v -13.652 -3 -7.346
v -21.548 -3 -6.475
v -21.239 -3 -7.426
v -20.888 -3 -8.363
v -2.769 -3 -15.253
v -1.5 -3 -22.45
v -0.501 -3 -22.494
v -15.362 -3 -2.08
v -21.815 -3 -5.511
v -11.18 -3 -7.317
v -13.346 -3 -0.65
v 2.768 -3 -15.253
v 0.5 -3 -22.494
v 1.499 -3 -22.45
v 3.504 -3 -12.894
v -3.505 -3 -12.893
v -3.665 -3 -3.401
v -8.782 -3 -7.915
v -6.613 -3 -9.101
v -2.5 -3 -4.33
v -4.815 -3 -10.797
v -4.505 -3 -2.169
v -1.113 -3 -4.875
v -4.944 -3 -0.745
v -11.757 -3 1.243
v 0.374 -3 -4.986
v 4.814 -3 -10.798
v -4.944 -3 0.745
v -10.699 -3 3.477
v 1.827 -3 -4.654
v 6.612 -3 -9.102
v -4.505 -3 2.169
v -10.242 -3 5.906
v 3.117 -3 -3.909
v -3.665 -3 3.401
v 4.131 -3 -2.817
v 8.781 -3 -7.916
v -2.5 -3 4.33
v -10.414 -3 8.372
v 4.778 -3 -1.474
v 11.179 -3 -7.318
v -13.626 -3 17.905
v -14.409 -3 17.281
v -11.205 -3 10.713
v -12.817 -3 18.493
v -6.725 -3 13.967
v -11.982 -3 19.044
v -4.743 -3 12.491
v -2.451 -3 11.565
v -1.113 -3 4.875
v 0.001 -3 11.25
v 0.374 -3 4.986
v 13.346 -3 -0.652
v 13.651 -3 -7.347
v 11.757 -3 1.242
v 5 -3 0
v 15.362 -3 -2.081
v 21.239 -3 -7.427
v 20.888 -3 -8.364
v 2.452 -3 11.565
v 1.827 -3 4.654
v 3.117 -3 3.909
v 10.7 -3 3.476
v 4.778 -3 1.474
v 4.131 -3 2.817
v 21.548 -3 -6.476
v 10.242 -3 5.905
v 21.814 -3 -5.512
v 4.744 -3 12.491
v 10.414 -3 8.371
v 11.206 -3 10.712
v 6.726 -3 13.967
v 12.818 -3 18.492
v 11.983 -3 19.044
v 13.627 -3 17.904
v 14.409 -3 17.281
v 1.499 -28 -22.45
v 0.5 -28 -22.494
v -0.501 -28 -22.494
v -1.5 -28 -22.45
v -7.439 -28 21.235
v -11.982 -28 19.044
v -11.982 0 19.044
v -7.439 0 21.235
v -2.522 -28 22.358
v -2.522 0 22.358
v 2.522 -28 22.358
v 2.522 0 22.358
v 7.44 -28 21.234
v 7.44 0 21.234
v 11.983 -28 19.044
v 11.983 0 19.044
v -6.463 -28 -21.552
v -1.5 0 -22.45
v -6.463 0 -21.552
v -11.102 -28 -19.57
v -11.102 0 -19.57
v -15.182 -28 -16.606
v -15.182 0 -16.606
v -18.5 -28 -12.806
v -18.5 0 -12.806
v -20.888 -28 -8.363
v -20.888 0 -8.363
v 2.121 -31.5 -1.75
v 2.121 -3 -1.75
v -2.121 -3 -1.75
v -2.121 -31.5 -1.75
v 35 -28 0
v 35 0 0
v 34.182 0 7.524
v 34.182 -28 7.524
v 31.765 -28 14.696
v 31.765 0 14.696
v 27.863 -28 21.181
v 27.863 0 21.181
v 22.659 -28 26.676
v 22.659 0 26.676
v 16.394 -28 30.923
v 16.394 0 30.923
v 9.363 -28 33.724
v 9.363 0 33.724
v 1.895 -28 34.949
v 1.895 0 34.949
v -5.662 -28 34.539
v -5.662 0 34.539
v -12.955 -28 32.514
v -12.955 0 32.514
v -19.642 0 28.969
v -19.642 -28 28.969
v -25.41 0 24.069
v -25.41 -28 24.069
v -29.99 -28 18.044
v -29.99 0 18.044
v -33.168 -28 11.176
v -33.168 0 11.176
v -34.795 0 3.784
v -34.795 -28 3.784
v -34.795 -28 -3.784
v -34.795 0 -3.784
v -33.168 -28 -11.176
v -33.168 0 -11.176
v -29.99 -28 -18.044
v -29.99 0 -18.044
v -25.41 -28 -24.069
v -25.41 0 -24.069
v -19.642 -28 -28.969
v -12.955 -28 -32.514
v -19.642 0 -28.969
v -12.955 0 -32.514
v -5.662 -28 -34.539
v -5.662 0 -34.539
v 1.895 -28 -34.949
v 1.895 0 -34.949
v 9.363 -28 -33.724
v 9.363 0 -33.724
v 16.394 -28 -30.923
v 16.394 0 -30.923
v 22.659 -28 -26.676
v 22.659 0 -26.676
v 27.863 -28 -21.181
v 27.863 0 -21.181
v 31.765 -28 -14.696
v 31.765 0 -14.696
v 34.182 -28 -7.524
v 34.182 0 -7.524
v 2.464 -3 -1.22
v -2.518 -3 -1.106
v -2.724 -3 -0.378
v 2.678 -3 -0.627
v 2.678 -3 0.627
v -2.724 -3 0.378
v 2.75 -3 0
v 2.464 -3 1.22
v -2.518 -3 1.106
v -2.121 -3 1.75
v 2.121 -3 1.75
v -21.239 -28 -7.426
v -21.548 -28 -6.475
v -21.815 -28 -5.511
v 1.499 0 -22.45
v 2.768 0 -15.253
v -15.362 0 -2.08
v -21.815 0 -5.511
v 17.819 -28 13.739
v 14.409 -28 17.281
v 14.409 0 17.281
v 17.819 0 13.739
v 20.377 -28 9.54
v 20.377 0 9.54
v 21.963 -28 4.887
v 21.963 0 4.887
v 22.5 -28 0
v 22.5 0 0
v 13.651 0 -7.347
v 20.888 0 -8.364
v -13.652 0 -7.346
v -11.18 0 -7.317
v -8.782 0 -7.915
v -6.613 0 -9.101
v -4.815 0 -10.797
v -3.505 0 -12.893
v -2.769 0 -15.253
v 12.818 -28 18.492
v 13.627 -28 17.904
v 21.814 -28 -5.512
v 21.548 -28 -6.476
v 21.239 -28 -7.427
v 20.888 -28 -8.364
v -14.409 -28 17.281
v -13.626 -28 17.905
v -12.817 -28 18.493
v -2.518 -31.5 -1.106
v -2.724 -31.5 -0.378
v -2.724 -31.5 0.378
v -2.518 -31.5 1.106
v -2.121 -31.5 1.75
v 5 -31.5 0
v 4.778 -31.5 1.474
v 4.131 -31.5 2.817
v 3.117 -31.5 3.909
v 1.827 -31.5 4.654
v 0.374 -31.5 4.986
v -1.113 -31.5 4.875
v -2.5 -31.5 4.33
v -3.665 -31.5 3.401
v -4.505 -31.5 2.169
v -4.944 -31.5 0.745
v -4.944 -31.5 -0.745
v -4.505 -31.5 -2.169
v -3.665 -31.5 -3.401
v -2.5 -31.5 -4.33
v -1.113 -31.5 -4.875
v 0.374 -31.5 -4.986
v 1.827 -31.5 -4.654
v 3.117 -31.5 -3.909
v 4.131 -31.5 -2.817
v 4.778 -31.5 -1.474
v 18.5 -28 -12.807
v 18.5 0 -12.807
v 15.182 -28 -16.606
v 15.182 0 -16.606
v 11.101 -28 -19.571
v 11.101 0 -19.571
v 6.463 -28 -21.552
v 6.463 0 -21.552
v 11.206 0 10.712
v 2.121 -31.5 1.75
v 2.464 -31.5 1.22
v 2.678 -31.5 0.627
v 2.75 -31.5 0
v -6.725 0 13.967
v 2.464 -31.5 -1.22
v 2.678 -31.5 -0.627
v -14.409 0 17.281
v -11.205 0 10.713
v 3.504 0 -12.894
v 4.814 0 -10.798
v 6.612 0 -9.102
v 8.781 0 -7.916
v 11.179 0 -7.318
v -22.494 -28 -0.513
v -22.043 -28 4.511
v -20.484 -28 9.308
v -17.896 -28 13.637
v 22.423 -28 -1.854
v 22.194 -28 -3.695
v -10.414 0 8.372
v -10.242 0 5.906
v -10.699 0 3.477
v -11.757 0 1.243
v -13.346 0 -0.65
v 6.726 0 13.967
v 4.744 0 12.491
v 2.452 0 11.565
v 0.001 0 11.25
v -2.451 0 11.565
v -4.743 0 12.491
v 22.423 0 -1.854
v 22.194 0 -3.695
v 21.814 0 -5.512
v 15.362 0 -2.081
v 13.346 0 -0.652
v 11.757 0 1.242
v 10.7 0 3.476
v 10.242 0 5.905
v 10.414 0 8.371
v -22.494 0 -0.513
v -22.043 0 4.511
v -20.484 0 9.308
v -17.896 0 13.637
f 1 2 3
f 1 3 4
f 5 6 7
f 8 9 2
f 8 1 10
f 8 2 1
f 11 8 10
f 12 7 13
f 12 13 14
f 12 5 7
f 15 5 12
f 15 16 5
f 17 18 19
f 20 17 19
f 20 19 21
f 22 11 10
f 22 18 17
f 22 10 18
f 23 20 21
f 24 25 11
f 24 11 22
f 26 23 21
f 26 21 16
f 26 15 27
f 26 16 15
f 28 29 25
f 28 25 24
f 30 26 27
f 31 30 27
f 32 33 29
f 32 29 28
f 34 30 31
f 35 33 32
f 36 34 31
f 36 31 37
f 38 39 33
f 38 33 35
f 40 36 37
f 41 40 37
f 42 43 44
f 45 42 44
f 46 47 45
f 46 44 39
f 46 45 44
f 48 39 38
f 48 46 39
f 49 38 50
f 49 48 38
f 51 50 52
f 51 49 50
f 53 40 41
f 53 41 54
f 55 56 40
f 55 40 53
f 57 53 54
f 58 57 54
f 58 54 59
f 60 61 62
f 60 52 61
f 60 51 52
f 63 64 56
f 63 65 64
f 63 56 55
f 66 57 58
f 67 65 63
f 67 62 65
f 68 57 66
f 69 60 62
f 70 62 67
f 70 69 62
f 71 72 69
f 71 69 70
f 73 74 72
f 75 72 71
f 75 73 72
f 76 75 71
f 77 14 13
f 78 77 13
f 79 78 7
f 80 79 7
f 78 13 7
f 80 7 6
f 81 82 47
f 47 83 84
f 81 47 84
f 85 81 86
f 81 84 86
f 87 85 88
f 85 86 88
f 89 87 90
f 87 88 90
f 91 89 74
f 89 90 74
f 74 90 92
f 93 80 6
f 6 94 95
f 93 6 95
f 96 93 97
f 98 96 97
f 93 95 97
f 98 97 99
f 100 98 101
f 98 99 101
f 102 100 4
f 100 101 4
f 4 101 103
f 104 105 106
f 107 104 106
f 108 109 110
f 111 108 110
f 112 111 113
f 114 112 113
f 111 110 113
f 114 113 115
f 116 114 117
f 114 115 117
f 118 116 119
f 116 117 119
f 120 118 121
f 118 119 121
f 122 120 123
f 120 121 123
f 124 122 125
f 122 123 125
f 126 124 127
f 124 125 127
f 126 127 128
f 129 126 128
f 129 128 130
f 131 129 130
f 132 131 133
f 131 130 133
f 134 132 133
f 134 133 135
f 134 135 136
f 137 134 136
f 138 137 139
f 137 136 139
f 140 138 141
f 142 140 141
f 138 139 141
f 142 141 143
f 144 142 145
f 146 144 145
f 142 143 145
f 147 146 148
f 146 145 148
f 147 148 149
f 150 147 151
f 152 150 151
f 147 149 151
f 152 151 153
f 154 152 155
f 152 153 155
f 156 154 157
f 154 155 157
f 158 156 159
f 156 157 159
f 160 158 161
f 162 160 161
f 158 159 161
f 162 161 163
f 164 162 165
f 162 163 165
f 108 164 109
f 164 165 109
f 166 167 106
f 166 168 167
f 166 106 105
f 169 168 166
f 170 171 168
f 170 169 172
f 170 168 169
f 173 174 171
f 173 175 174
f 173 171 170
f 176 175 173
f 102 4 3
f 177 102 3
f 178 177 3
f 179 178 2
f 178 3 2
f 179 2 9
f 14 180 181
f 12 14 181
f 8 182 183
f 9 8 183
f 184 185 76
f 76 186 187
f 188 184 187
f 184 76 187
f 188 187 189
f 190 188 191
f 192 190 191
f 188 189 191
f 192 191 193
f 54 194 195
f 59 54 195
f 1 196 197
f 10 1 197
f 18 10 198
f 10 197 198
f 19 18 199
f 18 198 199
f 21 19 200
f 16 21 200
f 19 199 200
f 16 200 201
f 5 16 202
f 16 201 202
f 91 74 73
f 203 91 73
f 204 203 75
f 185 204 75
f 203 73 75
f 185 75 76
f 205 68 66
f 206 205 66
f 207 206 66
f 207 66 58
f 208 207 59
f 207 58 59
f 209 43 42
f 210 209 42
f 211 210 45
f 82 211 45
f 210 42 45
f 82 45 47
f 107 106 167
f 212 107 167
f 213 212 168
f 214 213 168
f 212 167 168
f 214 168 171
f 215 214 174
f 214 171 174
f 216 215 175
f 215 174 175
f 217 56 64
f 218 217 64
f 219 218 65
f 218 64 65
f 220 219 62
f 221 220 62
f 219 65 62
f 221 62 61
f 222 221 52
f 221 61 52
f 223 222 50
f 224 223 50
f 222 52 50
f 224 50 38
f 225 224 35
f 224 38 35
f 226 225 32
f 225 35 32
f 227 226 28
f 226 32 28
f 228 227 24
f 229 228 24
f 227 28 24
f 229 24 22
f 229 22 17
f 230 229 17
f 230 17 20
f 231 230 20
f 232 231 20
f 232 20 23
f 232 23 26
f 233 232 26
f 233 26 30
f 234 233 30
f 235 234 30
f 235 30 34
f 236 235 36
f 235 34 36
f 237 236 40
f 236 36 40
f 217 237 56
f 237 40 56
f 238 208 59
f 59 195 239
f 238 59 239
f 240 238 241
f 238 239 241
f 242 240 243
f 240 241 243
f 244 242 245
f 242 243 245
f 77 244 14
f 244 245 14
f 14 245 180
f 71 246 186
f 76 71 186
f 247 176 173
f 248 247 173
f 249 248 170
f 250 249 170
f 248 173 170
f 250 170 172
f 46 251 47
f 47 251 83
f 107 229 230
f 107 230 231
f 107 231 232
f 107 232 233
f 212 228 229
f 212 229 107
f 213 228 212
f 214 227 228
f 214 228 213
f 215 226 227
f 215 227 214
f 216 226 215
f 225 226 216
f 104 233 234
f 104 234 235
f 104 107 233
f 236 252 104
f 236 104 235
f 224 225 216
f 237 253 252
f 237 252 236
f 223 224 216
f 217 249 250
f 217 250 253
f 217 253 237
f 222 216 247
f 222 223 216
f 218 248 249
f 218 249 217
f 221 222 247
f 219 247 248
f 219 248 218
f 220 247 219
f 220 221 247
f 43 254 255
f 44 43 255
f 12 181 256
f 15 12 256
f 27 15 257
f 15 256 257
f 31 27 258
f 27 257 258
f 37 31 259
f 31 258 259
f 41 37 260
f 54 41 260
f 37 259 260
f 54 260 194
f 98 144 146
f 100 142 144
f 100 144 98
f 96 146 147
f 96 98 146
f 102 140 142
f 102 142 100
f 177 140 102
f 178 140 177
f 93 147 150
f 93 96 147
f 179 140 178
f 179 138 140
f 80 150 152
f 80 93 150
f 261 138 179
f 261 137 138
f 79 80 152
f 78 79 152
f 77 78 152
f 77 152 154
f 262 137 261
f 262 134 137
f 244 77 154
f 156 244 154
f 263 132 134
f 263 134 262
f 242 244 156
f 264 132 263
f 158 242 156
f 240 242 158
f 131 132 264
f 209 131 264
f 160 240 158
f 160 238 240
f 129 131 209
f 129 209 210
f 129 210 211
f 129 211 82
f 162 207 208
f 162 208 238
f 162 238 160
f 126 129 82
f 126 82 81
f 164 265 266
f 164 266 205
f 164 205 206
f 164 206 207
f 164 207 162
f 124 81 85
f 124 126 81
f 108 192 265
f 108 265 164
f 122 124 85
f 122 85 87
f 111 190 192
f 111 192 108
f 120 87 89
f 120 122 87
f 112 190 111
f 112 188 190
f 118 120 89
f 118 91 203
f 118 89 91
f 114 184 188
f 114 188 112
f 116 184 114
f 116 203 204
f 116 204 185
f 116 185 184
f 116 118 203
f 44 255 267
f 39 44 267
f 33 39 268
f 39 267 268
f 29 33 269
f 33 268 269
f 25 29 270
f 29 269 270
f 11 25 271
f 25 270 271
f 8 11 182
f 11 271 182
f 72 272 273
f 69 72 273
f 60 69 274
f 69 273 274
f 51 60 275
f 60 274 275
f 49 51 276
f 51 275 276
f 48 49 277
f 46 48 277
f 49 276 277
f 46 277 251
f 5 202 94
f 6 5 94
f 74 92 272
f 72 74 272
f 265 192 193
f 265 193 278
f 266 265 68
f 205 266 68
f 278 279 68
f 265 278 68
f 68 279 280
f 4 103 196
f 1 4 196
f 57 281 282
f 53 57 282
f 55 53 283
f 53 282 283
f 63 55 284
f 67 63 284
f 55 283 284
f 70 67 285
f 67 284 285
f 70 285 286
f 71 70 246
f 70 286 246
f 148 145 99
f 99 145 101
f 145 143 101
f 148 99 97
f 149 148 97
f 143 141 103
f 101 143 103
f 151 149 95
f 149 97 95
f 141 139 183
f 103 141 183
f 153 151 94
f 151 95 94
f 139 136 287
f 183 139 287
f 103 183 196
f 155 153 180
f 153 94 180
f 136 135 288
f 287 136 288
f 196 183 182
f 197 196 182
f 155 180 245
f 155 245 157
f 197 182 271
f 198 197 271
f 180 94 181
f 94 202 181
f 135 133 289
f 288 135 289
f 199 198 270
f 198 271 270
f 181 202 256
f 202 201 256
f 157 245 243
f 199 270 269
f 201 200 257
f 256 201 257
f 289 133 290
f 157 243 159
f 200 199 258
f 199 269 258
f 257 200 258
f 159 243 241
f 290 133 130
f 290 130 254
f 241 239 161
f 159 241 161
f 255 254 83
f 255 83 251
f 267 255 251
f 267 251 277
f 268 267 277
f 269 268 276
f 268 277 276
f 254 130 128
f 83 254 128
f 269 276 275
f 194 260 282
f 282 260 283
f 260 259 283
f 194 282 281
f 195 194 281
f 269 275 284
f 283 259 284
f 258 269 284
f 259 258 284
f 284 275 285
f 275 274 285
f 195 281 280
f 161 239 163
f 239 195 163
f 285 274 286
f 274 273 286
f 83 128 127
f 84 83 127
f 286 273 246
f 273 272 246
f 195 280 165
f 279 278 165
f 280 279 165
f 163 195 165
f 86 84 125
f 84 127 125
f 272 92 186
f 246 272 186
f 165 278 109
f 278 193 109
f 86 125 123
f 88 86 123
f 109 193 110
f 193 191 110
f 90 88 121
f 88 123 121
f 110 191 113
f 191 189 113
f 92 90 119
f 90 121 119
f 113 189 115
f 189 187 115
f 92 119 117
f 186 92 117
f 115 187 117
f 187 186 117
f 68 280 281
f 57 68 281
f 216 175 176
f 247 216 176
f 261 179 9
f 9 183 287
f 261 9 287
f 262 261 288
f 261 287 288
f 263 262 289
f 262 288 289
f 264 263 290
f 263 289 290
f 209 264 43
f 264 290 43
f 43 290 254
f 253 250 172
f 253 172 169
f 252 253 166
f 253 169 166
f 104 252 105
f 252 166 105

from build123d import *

# Parameters (mm, degrees)
F0_R     = 8.75
F1_DEPTH = 3
F0_R_2   = 35
F2_DEPTH = 28
F3_R     = 5
F4_DEPTH = 28.5


with BuildPart() as f1:
    # F0 (on Front) → F1 (new body)
    with BuildSketch(Plane.XZ):
        with BuildLine():
            Line((11.2055757109, 10.7121584512), (14.409271678, 17.2807085997))
            ThreePointArc((14.409271678, 17.2807085997), (13.2255061098, 18.2026368458), (11.9829277906, 19.043619445))
            Line((11.9829277906, 19.043619445), (6.7263225873, 13.9673748066))
            ThreePointArc((6.7263225873, 13.9673748066), (0.0005839076, 11.2499999919), (-6.7251547721, 13.9673748066))
            Line((-6.7251547721, 13.9673748066), (-11.9822206949, 19.0440643566))
            ThreePointArc((-11.9822206949, 19.0440643566), (-13.2248302388, 18.2031278948), (-14.4086300373, 17.2812436025))
            Line((-14.4086300373, 17.2812436025), (-11.2052148362, 10.7132691094))
            ThreePointArc((-11.2052148362, 10.7132691094), (-10.6992053632, 3.4769965133), (-15.3619499397, -2.0798460871))
            Line((-15.3619499397, -2.0798460871), (-21.8146913282, -5.5108295434))
            ThreePointArc((-21.8146913282, -5.5108295434), (-21.3989006928, -6.9524851052), (-20.887950885, -8.3632235308))
            Line((-20.887950885, -8.3632235308), (-13.6515262074, -7.3462103663))
            ThreePointArc((-13.6515262074, -7.3462103663), (-6.6130564747, -9.1010979679), (-2.7690524241, -15.2527903798))
            Line((-2.7690524241, -15.2527903798), (-1.5, -22.4499443206))
            ThreePointArc((-1.5, -22.4499443206), (-0.0004177112, -22.4999999961), (1.4991664351, -22.45))
            Line((1.4991664351, -22.45), (2.7681076417, -15.2534768043))
            ThreePointArc((2.7681076417, -15.2534768043), (6.6121116923, -9.1017843924), (13.650581425, -7.3468967909))
            Line((13.650581425, -7.3468967909), (20.887640345, -8.3639990923))
            ThreePointArc((20.887640345, -8.3639990923), (21.3986425331, -6.9532796392), (21.8144866967, -5.5116395166))
            Line((21.8144866967, -5.5116395166), (15.3623108145, -2.0809567454))
            ThreePointArc((15.3623108145, -2.0809567454), (10.6995662379, 3.4758858551), (11.2055757109, 10.7121584512))
        make_face()
        Circle(F0_R, mode=Mode.SUBTRACT)
        Circle(F0_R)
        Polygon((-3.4579752893, 1.1235642806), (0, 3.635930389), (3.4579752893, 1.1235642806), (2.137146261, -2.9415294751), (-2.137146261, -2.9415294751), align=None, mode=Mode.SUBTRACT)
        Polygon((3.4579752893, 1.1235642806), (0, 3.635930389), (-3.4579752893, 1.1235642806), (-2.137146261, -2.9415294751), (2.137146261, -2.9415294751), align=None)
    extrude(amount=F1_DEPTH)

    # F0 (on Front) → F2 (join)
    with BuildSketch(Plane.XZ):
        Circle(F0_R_2)
        with BuildLine():
            ThreePointArc((14.409271678, 17.2807085997), (20.3771761139, 9.540476593), (22.5, 0))
            ThreePointArc((22.5, 0), (22.3279639765, -2.7770532337), (21.8144866967, -5.5116395166))
            ThreePointArc((21.8144866967, -5.5116395166), (21.3986425331, -6.9532796392), (20.887640345, -8.3639990923))
            ThreePointArc((20.887640345, -8.3639990923), (13.2248302388, -18.2031278948), (1.4991664351, -22.45))
            ThreePointArc((1.4991664351, -22.45), (-0.0004177112, -22.4999999961), (-1.5, -22.4499443206))
            ThreePointArc((-1.5, -22.4499443206), (-13.2255061098, -18.2026368458), (-20.887950885, -8.3632235308))
            ThreePointArc((-20.887950885, -8.3632235308), (-21.3989006928, -6.9524851052), (-21.8146913282, -5.5108295434))
            ThreePointArc((-21.8146913282, -5.5108295434), (-21.3986425331, 6.9532796392), (-14.4086300373, 17.2812436025))
            ThreePointArc((-14.4086300373, 17.2812436025), (-13.2248302388, 18.2031278948), (-11.9822206949, 19.0440643566))
            ThreePointArc((-11.9822206949, 19.0440643566), (0.0004177112, 22.4999999961), (11.9829277906, 19.043619445))
            ThreePointArc((11.9829277906, 19.043619445), (13.2255061098, 18.2026368458), (14.409271678, 17.2807085997))
        make_face(mode=Mode.SUBTRACT)
    extrude(amount=F2_DEPTH)

    # F3 (on face) → F4 (join)
    with BuildSketch(Plane.XZ.offset(3)):
        Circle(F3_R)
        with BuildLine():
            ThreePointArc((2.1213203436, 1.75), (2.5880621075, 0.9297497123), (2.75, 0))
            ThreePointArc((2.75, 0), (2.5880621075, -0.9297497123), (2.1213203436, -1.75))
            ThreePointArc((2.1213203436, -1.75), (0, -2.75), (-2.1213203436, -1.75))
            ThreePointArc((-2.1213203436, -1.75), (-2.75, 0), (-2.1213203436, 1.75))
            ThreePointArc((-2.1213203436, 1.75), (0, 2.75), (2.1213203436, 1.75))
        make_face(mode=Mode.SUBTRACT)
        with BuildLine():
            Line((-2.1213203436, 1.75), (2.1213203436, 1.75))
            ThreePointArc((2.1213203436, 1.75), (0, 2.75), (-2.1213203436, 1.75))
        make_face()
        with BuildLine():
            ThreePointArc((-2.1213203436, -1.75), (0, -2.75), (2.1213203436, -1.75))
            Line((2.1213203436, -1.75), (-2.1213203436, -1.75))
        make_face()
    extrude(amount=F4_DEPTH)


solid = f1.part
